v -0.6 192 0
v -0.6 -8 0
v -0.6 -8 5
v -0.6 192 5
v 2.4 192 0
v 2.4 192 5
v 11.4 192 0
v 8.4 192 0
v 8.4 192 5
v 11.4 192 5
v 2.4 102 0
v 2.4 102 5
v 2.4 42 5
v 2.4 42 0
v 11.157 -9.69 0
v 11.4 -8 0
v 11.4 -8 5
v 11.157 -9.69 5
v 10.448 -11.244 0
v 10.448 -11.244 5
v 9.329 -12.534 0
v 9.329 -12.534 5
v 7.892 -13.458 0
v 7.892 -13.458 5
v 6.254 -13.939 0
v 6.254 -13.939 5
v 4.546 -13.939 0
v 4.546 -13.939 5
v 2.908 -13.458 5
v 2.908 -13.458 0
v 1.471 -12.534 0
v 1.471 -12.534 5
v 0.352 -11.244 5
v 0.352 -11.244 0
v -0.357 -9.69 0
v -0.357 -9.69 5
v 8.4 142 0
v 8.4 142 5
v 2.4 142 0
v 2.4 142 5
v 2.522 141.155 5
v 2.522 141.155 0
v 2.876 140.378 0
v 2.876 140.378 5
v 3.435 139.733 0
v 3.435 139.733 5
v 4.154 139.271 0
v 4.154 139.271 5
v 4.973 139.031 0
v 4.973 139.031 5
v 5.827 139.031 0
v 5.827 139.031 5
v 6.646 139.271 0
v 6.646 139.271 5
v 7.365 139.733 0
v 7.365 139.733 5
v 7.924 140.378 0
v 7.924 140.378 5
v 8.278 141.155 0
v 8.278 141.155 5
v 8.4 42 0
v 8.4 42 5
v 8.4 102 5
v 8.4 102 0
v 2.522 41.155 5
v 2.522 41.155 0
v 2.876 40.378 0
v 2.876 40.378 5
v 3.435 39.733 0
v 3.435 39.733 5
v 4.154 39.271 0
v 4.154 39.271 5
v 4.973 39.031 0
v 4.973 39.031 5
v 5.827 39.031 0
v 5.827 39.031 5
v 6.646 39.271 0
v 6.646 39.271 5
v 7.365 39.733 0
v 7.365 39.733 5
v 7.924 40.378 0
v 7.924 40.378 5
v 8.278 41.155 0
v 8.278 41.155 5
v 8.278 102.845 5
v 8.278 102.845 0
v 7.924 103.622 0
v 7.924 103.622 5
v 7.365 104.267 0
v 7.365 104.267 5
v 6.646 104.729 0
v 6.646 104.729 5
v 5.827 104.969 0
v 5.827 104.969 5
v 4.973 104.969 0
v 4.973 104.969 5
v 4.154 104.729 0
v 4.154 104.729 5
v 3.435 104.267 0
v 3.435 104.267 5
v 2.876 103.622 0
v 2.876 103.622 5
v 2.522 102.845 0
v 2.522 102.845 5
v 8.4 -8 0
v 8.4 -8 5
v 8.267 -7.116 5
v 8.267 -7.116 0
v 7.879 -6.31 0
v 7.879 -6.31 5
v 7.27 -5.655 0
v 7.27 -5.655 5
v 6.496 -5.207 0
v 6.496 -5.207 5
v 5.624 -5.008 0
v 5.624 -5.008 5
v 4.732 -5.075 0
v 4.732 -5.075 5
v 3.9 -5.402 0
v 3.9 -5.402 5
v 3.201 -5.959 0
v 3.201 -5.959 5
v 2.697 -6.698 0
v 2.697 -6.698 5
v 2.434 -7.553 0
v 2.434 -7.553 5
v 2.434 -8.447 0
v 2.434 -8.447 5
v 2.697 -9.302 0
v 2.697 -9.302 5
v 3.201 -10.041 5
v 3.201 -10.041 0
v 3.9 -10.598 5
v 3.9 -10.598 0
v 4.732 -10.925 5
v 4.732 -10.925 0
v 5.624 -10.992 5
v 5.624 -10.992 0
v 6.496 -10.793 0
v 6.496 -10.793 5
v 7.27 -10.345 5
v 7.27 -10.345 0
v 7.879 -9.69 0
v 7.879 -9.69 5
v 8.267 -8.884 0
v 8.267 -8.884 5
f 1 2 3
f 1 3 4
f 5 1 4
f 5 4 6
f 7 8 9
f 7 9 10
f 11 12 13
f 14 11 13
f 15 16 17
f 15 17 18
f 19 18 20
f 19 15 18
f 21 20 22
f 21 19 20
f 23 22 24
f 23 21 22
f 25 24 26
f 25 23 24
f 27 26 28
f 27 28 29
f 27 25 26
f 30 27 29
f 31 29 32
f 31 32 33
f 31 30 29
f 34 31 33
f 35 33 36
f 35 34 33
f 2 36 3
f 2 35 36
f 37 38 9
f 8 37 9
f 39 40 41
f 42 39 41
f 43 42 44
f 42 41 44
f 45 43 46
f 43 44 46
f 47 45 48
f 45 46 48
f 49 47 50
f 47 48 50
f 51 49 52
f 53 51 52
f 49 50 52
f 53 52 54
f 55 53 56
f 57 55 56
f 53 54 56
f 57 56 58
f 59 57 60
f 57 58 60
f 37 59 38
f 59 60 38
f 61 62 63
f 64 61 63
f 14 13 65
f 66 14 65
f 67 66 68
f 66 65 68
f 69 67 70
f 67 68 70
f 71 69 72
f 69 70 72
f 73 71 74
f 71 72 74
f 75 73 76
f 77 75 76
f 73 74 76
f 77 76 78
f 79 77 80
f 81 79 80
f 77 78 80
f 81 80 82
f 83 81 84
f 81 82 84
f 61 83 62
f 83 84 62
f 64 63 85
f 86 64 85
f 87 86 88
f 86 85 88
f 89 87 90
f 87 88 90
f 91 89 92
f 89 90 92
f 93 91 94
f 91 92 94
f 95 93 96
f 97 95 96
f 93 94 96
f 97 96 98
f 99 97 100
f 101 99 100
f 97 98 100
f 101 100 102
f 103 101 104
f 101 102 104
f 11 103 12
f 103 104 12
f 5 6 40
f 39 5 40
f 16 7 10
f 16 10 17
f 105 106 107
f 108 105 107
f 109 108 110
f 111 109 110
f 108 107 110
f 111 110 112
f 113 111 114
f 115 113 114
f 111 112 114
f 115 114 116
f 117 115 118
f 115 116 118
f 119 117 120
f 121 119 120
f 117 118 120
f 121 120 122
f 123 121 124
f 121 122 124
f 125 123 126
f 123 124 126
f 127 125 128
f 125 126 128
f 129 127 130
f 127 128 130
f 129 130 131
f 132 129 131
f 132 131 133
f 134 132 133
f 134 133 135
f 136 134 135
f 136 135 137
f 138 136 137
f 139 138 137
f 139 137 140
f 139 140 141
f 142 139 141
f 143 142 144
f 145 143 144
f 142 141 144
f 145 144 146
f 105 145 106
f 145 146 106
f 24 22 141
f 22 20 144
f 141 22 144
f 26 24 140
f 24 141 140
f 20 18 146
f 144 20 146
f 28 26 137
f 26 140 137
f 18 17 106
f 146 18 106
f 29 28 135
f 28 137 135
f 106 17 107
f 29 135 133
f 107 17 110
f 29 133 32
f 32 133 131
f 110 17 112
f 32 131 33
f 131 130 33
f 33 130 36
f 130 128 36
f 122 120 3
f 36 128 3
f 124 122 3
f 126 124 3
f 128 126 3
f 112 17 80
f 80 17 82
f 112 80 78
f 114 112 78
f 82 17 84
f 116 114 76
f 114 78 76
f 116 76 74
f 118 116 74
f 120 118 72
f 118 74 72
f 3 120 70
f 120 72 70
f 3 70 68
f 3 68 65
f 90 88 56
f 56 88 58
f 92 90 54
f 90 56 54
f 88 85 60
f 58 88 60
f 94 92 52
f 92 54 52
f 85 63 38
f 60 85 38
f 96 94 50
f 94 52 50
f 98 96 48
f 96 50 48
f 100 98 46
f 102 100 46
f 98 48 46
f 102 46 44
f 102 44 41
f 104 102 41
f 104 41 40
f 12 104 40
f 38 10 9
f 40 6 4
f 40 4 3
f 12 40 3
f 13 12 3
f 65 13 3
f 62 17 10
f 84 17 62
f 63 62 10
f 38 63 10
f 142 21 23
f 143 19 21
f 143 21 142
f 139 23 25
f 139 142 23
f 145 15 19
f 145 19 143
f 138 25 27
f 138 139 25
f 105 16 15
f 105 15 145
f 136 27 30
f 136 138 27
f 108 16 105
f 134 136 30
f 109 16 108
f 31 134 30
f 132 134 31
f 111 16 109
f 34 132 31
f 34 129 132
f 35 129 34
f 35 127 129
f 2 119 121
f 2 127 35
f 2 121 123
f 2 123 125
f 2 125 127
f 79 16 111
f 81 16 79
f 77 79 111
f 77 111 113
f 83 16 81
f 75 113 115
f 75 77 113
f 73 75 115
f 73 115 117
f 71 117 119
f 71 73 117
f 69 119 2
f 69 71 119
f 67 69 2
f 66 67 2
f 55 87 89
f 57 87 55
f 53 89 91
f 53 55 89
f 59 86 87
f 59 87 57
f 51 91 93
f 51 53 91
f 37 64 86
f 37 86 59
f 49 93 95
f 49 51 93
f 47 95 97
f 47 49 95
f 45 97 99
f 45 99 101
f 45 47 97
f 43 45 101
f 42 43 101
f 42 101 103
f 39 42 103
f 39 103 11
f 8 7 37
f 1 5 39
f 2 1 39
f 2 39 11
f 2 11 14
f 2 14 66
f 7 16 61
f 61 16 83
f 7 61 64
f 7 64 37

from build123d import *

# Parameters (mm, degrees)
BOSS_EXTRUDE1_DEPTH = 5
SKETCH2_R           = 3
CUT_EXTRUDE1_DEPTH  = 5
CUT_EXTRUDE2_DEPTH  = 5
CUT_EXTRUDE7_DEPTH  = 5


with BuildPart() as part:
    # Sketch1 → Boss-Extrude1 (new body)
    with BuildSketch(Plane.XY):
        with BuildLine():
            Line((-0.6, -8), (-0.6, 192))
            Line((-0.6, 192), (11.4, 192))
            Line((11.4, 192), (11.4, -8))
            ThreePointArc((11.4, -8), (5.4, -14), (-0.6, -8))
        make_face()
    extrude(amount=BOSS_EXTRUDE1_DEPTH)

    # Sketch2 → Cut-Extrude1 (cut)
    with BuildSketch(Plane.XY.offset(5)):
        with Locations((5.4, -8)):
            Circle(SKETCH2_R)
    extrude(amount=-CUT_EXTRUDE1_DEPTH, mode=Mode.SUBTRACT)

    # Sketch4 → Cut-Extrude2 (cut)
    with BuildSketch(Plane.XY.offset(5)):
        with BuildLine():
            Line((2.4, 102), (2.4, 42))
            ThreePointArc((2.4, 42), (5.4, 39), (8.4, 42))
            Line((8.4, 42), (8.4, 102))
            ThreePointArc((8.4, 102), (5.4, 105), (2.4, 102))
        make_face()
    extrude(amount=-CUT_EXTRUDE2_DEPTH, mode=Mode.SUBTRACT)

    # Sketch5 → Cut-Extrude7 (cut)
    with BuildSketch(Plane.XY.offset(5)):
        with BuildLine():
            Line((2.4, 192), (2.4, 142))
            ThreePointArc((2.4, 142), (5.4, 139), (8.4, 142))
            Line((8.4, 142), (8.4, 192))
            Line((8.4, 192), (2.4, 192))
        make_face()
    extrude(amount=-CUT_EXTRUDE7_DEPTH, mode=Mode.SUBTRACT)


solid = part.part
